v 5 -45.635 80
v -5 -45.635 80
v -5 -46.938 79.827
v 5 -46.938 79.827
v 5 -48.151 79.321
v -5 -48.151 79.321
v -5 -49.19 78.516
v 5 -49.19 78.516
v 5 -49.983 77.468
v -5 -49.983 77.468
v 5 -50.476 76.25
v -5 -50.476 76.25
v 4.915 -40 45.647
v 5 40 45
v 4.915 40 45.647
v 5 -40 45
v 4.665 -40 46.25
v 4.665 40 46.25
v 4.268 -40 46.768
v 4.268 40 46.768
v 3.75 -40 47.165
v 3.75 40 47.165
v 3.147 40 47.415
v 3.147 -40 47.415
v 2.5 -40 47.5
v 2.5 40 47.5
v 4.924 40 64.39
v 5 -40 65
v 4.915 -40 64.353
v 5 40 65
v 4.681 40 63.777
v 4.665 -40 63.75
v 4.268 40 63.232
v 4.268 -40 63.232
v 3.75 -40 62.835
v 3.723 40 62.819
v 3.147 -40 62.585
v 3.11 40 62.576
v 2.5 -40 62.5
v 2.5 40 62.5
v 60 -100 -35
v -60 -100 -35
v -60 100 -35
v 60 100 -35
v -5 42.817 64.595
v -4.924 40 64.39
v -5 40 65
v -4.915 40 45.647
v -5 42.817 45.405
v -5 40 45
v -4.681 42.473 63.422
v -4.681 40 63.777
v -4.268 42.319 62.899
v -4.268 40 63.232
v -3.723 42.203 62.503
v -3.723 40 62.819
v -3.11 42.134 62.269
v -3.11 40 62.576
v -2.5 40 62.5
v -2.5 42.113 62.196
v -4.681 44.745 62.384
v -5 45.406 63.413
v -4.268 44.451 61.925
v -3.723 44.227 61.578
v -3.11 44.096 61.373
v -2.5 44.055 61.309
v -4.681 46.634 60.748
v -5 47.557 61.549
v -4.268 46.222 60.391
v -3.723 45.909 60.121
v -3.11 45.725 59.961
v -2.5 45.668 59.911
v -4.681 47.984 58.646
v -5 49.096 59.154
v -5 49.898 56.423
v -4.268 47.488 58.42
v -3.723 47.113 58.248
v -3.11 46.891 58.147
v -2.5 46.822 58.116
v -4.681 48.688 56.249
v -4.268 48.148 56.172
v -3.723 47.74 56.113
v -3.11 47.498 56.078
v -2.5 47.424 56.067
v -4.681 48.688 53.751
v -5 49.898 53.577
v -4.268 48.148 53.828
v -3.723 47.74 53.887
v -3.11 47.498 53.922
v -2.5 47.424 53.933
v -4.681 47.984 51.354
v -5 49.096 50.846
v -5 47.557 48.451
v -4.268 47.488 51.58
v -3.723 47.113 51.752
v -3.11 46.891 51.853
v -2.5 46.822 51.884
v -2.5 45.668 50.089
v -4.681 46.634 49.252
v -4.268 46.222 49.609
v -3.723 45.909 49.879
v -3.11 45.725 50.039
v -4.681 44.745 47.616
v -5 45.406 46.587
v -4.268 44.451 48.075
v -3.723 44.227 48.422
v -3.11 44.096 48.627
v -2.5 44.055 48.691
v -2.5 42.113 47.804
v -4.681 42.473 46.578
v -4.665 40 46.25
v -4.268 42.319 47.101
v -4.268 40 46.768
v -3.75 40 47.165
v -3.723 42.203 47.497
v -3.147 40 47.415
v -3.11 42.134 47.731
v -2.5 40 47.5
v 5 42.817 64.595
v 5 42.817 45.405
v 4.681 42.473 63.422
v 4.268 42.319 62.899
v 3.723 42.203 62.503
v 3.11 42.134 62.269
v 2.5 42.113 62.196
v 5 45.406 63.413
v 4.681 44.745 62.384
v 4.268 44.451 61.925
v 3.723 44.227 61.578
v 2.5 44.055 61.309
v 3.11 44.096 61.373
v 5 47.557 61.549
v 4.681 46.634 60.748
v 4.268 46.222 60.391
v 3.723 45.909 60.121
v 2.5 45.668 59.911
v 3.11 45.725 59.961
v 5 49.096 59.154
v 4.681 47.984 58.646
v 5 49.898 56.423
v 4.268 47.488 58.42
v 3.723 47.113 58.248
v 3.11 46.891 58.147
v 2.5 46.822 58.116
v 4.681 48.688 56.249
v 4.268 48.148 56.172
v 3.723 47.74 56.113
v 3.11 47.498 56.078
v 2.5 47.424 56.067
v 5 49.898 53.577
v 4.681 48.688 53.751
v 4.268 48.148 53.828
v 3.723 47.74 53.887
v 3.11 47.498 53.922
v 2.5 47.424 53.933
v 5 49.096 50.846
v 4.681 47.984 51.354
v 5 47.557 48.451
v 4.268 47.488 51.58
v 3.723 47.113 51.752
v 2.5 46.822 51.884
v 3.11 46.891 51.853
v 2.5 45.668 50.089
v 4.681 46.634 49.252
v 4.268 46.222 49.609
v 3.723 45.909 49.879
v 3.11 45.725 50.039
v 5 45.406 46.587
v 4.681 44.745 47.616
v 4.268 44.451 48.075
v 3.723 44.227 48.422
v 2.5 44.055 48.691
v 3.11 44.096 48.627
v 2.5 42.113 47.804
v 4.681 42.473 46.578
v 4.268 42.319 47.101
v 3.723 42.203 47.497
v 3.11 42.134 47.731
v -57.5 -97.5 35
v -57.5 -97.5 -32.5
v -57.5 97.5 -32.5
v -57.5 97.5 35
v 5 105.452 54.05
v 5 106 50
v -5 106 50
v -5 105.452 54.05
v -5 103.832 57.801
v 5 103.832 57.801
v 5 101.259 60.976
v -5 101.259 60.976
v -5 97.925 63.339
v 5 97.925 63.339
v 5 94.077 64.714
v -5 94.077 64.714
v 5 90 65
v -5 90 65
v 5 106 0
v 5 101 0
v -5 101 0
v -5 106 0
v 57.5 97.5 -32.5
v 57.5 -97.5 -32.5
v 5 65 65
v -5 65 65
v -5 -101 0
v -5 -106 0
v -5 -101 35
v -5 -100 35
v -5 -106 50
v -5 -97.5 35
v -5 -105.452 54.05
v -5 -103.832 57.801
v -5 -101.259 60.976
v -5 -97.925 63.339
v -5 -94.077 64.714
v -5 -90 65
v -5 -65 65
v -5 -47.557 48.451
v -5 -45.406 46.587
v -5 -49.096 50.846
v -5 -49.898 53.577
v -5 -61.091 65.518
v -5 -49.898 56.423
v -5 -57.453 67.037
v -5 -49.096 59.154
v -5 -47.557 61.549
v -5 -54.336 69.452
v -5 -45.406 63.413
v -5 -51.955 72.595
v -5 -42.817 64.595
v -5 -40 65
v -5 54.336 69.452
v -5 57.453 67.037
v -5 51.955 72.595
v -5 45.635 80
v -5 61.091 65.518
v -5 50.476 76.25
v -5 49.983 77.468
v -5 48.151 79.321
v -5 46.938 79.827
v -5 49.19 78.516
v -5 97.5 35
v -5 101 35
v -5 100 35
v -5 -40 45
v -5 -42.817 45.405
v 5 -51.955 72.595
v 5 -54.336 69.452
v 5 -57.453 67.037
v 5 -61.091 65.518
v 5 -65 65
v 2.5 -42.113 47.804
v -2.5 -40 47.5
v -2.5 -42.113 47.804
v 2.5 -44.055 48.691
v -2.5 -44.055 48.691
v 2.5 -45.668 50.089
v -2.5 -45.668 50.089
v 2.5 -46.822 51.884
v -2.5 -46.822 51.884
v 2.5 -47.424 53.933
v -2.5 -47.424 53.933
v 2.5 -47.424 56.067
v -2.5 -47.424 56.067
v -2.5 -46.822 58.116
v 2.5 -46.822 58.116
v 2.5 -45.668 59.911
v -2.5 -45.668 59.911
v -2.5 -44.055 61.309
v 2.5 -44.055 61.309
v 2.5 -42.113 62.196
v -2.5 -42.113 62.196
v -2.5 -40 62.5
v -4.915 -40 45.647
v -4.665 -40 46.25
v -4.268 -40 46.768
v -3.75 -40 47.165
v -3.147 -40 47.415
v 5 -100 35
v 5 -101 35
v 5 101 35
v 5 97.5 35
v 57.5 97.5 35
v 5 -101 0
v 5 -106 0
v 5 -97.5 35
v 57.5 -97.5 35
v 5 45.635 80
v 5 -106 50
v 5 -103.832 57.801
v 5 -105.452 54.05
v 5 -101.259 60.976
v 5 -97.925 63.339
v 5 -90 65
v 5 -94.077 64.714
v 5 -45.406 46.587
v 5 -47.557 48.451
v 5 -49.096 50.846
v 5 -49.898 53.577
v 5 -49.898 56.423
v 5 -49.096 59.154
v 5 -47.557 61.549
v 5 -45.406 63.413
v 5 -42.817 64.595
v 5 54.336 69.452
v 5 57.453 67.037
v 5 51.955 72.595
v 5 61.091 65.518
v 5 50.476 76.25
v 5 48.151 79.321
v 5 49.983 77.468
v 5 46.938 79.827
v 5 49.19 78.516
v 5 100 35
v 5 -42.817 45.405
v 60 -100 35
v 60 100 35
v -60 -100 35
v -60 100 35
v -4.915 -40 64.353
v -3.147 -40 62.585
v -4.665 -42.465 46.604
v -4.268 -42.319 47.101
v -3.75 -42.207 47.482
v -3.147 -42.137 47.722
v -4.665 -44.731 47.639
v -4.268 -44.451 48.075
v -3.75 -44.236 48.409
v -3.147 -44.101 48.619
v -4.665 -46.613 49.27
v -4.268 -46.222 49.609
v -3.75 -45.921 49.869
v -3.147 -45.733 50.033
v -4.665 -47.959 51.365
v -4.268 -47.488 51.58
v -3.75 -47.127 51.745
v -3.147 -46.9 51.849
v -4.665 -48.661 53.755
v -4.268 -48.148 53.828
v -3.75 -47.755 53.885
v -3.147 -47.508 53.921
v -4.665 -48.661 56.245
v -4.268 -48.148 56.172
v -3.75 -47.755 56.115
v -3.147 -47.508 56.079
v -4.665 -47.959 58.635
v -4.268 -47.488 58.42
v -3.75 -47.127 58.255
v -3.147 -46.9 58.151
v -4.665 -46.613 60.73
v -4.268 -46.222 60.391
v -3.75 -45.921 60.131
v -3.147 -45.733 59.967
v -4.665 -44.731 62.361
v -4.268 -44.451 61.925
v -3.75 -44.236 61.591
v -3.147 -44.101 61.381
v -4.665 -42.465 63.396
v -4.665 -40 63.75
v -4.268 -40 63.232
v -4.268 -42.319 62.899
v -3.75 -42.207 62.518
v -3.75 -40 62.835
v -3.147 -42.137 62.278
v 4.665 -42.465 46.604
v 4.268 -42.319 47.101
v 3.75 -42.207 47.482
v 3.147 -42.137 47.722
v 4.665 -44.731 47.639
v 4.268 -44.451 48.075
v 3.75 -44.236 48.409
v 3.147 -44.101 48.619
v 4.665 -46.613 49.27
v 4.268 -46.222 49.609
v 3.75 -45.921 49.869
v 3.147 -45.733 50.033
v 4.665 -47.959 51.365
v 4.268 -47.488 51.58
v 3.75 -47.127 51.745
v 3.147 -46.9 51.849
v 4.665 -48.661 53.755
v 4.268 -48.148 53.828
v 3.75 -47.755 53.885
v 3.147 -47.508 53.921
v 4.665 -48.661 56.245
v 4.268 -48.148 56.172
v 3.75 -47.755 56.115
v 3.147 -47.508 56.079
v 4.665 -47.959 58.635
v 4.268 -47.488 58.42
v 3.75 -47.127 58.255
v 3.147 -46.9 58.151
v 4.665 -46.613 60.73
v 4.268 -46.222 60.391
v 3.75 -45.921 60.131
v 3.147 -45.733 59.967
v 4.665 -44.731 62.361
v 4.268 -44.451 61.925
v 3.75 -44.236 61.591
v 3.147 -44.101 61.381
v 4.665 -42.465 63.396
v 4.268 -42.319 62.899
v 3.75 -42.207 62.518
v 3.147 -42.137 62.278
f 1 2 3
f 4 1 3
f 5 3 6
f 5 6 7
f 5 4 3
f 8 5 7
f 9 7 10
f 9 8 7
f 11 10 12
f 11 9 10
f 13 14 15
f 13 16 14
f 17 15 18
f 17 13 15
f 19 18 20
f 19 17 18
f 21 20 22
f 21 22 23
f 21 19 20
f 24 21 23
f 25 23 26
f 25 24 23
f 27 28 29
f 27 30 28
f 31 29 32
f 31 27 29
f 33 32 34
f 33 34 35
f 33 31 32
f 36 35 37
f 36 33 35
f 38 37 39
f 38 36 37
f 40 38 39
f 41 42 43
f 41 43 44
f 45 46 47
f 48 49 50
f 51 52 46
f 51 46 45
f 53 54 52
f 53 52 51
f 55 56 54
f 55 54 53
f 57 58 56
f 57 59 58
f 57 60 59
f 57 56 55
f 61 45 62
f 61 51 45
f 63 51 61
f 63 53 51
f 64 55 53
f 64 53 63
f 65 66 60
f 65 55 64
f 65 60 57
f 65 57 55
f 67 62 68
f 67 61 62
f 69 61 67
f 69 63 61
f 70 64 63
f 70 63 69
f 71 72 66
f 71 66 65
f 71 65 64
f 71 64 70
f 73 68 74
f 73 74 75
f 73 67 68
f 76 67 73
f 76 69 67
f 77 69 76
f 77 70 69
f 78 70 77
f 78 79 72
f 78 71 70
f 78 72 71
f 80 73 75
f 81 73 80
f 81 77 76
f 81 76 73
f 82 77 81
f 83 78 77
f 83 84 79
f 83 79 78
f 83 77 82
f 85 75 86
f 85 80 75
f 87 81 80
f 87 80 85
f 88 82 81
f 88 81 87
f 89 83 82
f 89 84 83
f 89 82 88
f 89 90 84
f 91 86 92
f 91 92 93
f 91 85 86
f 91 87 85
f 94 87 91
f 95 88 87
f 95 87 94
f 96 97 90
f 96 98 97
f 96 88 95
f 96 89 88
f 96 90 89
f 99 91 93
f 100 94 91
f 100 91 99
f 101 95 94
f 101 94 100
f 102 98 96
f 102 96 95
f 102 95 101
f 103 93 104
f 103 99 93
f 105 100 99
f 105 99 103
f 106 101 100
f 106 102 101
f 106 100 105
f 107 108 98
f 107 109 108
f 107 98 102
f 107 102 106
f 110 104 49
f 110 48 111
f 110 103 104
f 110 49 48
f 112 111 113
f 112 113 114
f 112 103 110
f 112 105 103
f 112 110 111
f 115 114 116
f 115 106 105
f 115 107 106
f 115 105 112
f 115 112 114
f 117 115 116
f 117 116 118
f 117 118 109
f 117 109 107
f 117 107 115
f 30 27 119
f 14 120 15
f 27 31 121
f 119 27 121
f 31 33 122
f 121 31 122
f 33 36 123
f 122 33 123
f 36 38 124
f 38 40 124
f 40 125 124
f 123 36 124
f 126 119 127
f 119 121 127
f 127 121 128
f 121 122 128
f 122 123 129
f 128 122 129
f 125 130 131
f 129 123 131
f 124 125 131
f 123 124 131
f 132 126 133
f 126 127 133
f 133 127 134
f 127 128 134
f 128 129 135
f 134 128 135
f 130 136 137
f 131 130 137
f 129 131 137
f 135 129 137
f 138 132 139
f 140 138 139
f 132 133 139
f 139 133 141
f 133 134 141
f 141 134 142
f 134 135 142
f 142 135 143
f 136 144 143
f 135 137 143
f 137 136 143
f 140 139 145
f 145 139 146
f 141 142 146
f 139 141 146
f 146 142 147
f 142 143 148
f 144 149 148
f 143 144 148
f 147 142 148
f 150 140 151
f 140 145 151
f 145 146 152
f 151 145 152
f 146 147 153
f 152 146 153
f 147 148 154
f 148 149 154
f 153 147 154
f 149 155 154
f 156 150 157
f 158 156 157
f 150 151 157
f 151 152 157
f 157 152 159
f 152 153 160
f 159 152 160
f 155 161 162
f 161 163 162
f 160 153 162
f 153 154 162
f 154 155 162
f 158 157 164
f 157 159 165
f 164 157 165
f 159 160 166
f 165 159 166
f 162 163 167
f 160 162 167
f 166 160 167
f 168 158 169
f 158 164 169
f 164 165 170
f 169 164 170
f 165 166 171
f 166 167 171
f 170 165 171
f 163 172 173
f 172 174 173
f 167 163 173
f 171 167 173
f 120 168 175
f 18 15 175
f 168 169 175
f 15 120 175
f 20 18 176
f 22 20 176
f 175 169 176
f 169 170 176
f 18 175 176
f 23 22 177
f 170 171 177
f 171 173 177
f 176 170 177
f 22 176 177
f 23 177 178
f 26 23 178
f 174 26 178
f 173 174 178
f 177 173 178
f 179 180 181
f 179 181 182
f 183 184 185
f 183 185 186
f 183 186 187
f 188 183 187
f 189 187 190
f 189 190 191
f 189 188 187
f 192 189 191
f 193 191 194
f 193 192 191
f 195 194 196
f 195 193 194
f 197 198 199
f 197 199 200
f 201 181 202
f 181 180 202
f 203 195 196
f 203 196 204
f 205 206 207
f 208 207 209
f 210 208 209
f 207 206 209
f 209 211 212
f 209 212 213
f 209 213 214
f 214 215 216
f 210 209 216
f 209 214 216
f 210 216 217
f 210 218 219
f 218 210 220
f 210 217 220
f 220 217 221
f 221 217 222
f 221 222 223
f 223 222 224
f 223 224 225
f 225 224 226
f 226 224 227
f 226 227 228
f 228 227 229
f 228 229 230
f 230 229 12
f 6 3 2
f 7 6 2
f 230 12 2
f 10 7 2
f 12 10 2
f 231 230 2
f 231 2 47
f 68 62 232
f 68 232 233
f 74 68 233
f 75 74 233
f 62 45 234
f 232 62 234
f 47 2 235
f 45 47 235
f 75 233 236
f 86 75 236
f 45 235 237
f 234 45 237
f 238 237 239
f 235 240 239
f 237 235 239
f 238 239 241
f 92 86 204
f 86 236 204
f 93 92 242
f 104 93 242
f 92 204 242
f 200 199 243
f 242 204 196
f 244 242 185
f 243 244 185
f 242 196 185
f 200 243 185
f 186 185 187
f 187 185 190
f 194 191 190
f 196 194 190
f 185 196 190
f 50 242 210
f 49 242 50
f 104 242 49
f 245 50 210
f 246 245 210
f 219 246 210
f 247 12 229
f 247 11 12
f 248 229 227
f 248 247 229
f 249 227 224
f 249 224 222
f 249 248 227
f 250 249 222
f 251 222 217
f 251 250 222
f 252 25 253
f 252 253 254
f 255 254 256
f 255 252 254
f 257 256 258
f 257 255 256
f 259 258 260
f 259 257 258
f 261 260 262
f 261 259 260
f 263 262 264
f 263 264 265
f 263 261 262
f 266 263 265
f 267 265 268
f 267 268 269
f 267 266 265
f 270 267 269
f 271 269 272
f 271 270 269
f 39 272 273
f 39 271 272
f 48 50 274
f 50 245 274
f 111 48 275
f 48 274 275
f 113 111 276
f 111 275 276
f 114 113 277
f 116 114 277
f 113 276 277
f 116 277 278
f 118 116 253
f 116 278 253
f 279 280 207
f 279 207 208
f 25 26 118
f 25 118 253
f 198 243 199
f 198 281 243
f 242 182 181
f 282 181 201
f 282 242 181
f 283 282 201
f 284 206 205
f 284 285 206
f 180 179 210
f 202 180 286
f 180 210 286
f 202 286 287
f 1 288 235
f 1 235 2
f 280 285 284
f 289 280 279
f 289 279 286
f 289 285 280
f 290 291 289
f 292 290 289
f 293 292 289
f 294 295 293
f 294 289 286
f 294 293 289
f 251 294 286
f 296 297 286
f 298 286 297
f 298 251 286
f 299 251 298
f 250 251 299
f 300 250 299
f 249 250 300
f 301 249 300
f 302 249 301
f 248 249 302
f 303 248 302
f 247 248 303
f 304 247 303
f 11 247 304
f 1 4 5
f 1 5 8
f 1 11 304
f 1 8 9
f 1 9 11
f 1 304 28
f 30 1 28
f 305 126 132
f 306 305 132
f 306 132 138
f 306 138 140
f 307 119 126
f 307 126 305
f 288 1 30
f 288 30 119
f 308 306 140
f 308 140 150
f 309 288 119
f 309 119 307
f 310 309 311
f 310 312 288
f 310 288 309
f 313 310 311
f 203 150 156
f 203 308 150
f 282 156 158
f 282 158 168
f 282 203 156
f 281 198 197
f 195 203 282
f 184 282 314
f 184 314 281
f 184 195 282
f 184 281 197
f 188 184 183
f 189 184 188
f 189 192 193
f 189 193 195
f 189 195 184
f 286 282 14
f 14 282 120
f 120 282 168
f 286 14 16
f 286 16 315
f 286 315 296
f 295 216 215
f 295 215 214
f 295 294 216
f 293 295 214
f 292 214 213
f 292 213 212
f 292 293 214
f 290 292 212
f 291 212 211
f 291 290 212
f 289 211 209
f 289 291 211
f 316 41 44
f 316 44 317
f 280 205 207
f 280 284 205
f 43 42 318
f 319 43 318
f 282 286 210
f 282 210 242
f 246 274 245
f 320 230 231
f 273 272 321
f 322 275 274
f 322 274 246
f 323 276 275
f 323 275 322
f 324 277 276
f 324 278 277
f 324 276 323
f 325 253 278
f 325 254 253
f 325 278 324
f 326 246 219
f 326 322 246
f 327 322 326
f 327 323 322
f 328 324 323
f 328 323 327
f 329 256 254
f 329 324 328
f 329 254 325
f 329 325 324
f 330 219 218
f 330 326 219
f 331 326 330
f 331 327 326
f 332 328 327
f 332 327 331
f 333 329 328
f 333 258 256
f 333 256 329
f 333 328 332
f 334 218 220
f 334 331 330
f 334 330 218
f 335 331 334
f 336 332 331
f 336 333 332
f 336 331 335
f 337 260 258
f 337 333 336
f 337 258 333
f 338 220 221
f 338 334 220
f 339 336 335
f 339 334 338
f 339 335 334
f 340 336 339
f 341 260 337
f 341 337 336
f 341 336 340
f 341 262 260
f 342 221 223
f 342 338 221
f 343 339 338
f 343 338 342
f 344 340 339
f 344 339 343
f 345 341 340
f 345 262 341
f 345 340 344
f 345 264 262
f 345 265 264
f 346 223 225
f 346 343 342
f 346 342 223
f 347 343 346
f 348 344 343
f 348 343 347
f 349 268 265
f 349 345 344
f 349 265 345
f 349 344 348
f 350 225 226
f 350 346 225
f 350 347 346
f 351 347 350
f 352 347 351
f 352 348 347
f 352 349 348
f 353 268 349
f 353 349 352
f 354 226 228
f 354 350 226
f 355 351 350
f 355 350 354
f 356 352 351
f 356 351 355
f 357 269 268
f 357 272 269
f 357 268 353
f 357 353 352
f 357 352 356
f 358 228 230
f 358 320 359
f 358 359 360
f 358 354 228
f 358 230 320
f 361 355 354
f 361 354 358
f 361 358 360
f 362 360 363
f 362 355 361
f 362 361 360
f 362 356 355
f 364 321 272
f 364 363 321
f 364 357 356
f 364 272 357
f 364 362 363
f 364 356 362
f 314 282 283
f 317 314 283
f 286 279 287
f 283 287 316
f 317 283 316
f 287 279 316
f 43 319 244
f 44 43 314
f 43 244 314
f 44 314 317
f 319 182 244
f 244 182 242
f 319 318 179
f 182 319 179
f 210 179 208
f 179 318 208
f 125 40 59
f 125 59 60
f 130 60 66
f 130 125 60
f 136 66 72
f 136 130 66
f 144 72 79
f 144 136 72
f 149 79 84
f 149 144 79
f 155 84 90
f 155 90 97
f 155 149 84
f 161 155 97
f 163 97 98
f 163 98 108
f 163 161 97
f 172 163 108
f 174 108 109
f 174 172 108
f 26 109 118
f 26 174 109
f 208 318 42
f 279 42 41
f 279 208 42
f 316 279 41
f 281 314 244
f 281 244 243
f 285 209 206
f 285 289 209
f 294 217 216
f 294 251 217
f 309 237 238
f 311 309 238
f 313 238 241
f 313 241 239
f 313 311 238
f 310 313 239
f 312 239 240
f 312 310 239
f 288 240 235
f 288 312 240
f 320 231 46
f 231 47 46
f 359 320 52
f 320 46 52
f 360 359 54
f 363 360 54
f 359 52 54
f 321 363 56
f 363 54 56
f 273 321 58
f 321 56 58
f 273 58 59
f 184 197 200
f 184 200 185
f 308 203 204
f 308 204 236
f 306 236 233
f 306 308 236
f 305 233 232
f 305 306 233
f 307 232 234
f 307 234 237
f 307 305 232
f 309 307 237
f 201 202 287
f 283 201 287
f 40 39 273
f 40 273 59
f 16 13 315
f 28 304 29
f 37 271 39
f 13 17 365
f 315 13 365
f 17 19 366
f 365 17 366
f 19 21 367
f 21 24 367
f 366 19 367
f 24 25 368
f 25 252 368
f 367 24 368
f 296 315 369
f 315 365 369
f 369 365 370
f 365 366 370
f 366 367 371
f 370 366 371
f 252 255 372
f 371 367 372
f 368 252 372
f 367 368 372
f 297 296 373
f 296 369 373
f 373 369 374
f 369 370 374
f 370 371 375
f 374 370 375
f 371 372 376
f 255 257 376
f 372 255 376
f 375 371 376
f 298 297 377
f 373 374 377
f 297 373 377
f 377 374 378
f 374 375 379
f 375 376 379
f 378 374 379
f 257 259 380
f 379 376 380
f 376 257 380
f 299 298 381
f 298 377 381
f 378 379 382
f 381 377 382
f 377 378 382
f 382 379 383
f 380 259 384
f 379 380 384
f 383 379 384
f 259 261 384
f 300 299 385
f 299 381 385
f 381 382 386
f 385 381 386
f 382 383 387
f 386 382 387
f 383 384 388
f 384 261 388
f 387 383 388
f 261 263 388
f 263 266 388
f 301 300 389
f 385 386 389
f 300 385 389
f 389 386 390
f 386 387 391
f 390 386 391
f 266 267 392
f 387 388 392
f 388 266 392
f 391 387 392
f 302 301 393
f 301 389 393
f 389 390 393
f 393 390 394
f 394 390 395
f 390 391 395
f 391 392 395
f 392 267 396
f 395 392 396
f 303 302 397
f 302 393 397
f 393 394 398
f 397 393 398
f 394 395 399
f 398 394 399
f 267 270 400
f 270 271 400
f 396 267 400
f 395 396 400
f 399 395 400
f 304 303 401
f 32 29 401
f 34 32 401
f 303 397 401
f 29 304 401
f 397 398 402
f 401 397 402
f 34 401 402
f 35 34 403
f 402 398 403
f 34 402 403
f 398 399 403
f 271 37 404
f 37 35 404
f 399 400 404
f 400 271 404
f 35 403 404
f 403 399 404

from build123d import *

# Parameters (mm, degrees)
F0_W     = 120
F0_H     = 70
F1_DEPTH = 100
F2_T     = -2.5
F4_DEPTH = 5
F5_R     = 2.5


with BuildPart() as f1:
    # F0 (on Front) → F1 (new body, symmetric)
    with BuildSketch(Plane.XZ):
        Rectangle(F0_W, F0_H)
    extrude(amount=F1_DEPTH, both=True)

    # F2
    f2_openings = [f1.faces().sort_by_distance(p)[0] for p in [
        (0, 0, 35),
    ]]
    offset(amount=F2_T, openings=f2_openings)

    # F3 (on Right) → F4 (join, symmetric)
    with BuildSketch(Plane.YZ):
        with BuildLine():
            Line((0, 35), (101, 35))
            Line((101, 35), (101, 0))
            Line((101, 0), (106, 0))
            Line((106, 0), (106, 50))
            ThreePointArc((106, 50), (101.259154, 60.976431), (90, 65))
            Line((90, 65), (65, 65))
            ThreePointArc((65, 65), (55.814413, 68.141459), (50.476312, 76.25))
            ThreePointArc((50.476312, 76.25), (48.696945, 78.952847), (45.635083, 80))
            Line((45.635083, 80), (0, 80))
            Line((0, 80), (-45.635083, 80))
            ThreePointArc((-45.635083, 80), (-48.696945, 78.952847), (-50.476312, 76.25))
            ThreePointArc((-50.476312, 76.25), (-55.814413, 68.141459), (-65, 65))
            Line((-65, 65), (-90, 65))
            ThreePointArc((-90, 65), (-101.259154, 60.976431), (-106, 50))
            Line((-106, 50), (-106, 0))
            Line((-106, 0), (-101, 0))
            Line((-101, 0), (-101, 35))
            Line((-101, 35), (-100, 35))
            Line((-100, 35), (0, 35))
        make_face()
        with BuildLine():
            Line((40, 47.5), (0, 47.5))
            Line((0, 47.5), (-40, 47.5))
            ThreePointArc((-40, 47.5), (-47.5, 55), (-40, 62.5))
            Line((-40, 62.5), (0, 62.5))
            Line((0, 62.5), (40, 62.5))
            ThreePointArc((40, 62.5), (47.5, 55), (40, 47.5))
        make_face(mode=Mode.SUBTRACT)
    extrude(amount=F4_DEPTH, both=True)

    # F5
    f5_edges = [f1.edges().sort_by_distance(p)[0] for p in [
        (5, 0, 47.5),
        (-5, 0, 47.5),
    ]]
    fillet(f5_edges, radius=F5_R)


solid = f1.part
